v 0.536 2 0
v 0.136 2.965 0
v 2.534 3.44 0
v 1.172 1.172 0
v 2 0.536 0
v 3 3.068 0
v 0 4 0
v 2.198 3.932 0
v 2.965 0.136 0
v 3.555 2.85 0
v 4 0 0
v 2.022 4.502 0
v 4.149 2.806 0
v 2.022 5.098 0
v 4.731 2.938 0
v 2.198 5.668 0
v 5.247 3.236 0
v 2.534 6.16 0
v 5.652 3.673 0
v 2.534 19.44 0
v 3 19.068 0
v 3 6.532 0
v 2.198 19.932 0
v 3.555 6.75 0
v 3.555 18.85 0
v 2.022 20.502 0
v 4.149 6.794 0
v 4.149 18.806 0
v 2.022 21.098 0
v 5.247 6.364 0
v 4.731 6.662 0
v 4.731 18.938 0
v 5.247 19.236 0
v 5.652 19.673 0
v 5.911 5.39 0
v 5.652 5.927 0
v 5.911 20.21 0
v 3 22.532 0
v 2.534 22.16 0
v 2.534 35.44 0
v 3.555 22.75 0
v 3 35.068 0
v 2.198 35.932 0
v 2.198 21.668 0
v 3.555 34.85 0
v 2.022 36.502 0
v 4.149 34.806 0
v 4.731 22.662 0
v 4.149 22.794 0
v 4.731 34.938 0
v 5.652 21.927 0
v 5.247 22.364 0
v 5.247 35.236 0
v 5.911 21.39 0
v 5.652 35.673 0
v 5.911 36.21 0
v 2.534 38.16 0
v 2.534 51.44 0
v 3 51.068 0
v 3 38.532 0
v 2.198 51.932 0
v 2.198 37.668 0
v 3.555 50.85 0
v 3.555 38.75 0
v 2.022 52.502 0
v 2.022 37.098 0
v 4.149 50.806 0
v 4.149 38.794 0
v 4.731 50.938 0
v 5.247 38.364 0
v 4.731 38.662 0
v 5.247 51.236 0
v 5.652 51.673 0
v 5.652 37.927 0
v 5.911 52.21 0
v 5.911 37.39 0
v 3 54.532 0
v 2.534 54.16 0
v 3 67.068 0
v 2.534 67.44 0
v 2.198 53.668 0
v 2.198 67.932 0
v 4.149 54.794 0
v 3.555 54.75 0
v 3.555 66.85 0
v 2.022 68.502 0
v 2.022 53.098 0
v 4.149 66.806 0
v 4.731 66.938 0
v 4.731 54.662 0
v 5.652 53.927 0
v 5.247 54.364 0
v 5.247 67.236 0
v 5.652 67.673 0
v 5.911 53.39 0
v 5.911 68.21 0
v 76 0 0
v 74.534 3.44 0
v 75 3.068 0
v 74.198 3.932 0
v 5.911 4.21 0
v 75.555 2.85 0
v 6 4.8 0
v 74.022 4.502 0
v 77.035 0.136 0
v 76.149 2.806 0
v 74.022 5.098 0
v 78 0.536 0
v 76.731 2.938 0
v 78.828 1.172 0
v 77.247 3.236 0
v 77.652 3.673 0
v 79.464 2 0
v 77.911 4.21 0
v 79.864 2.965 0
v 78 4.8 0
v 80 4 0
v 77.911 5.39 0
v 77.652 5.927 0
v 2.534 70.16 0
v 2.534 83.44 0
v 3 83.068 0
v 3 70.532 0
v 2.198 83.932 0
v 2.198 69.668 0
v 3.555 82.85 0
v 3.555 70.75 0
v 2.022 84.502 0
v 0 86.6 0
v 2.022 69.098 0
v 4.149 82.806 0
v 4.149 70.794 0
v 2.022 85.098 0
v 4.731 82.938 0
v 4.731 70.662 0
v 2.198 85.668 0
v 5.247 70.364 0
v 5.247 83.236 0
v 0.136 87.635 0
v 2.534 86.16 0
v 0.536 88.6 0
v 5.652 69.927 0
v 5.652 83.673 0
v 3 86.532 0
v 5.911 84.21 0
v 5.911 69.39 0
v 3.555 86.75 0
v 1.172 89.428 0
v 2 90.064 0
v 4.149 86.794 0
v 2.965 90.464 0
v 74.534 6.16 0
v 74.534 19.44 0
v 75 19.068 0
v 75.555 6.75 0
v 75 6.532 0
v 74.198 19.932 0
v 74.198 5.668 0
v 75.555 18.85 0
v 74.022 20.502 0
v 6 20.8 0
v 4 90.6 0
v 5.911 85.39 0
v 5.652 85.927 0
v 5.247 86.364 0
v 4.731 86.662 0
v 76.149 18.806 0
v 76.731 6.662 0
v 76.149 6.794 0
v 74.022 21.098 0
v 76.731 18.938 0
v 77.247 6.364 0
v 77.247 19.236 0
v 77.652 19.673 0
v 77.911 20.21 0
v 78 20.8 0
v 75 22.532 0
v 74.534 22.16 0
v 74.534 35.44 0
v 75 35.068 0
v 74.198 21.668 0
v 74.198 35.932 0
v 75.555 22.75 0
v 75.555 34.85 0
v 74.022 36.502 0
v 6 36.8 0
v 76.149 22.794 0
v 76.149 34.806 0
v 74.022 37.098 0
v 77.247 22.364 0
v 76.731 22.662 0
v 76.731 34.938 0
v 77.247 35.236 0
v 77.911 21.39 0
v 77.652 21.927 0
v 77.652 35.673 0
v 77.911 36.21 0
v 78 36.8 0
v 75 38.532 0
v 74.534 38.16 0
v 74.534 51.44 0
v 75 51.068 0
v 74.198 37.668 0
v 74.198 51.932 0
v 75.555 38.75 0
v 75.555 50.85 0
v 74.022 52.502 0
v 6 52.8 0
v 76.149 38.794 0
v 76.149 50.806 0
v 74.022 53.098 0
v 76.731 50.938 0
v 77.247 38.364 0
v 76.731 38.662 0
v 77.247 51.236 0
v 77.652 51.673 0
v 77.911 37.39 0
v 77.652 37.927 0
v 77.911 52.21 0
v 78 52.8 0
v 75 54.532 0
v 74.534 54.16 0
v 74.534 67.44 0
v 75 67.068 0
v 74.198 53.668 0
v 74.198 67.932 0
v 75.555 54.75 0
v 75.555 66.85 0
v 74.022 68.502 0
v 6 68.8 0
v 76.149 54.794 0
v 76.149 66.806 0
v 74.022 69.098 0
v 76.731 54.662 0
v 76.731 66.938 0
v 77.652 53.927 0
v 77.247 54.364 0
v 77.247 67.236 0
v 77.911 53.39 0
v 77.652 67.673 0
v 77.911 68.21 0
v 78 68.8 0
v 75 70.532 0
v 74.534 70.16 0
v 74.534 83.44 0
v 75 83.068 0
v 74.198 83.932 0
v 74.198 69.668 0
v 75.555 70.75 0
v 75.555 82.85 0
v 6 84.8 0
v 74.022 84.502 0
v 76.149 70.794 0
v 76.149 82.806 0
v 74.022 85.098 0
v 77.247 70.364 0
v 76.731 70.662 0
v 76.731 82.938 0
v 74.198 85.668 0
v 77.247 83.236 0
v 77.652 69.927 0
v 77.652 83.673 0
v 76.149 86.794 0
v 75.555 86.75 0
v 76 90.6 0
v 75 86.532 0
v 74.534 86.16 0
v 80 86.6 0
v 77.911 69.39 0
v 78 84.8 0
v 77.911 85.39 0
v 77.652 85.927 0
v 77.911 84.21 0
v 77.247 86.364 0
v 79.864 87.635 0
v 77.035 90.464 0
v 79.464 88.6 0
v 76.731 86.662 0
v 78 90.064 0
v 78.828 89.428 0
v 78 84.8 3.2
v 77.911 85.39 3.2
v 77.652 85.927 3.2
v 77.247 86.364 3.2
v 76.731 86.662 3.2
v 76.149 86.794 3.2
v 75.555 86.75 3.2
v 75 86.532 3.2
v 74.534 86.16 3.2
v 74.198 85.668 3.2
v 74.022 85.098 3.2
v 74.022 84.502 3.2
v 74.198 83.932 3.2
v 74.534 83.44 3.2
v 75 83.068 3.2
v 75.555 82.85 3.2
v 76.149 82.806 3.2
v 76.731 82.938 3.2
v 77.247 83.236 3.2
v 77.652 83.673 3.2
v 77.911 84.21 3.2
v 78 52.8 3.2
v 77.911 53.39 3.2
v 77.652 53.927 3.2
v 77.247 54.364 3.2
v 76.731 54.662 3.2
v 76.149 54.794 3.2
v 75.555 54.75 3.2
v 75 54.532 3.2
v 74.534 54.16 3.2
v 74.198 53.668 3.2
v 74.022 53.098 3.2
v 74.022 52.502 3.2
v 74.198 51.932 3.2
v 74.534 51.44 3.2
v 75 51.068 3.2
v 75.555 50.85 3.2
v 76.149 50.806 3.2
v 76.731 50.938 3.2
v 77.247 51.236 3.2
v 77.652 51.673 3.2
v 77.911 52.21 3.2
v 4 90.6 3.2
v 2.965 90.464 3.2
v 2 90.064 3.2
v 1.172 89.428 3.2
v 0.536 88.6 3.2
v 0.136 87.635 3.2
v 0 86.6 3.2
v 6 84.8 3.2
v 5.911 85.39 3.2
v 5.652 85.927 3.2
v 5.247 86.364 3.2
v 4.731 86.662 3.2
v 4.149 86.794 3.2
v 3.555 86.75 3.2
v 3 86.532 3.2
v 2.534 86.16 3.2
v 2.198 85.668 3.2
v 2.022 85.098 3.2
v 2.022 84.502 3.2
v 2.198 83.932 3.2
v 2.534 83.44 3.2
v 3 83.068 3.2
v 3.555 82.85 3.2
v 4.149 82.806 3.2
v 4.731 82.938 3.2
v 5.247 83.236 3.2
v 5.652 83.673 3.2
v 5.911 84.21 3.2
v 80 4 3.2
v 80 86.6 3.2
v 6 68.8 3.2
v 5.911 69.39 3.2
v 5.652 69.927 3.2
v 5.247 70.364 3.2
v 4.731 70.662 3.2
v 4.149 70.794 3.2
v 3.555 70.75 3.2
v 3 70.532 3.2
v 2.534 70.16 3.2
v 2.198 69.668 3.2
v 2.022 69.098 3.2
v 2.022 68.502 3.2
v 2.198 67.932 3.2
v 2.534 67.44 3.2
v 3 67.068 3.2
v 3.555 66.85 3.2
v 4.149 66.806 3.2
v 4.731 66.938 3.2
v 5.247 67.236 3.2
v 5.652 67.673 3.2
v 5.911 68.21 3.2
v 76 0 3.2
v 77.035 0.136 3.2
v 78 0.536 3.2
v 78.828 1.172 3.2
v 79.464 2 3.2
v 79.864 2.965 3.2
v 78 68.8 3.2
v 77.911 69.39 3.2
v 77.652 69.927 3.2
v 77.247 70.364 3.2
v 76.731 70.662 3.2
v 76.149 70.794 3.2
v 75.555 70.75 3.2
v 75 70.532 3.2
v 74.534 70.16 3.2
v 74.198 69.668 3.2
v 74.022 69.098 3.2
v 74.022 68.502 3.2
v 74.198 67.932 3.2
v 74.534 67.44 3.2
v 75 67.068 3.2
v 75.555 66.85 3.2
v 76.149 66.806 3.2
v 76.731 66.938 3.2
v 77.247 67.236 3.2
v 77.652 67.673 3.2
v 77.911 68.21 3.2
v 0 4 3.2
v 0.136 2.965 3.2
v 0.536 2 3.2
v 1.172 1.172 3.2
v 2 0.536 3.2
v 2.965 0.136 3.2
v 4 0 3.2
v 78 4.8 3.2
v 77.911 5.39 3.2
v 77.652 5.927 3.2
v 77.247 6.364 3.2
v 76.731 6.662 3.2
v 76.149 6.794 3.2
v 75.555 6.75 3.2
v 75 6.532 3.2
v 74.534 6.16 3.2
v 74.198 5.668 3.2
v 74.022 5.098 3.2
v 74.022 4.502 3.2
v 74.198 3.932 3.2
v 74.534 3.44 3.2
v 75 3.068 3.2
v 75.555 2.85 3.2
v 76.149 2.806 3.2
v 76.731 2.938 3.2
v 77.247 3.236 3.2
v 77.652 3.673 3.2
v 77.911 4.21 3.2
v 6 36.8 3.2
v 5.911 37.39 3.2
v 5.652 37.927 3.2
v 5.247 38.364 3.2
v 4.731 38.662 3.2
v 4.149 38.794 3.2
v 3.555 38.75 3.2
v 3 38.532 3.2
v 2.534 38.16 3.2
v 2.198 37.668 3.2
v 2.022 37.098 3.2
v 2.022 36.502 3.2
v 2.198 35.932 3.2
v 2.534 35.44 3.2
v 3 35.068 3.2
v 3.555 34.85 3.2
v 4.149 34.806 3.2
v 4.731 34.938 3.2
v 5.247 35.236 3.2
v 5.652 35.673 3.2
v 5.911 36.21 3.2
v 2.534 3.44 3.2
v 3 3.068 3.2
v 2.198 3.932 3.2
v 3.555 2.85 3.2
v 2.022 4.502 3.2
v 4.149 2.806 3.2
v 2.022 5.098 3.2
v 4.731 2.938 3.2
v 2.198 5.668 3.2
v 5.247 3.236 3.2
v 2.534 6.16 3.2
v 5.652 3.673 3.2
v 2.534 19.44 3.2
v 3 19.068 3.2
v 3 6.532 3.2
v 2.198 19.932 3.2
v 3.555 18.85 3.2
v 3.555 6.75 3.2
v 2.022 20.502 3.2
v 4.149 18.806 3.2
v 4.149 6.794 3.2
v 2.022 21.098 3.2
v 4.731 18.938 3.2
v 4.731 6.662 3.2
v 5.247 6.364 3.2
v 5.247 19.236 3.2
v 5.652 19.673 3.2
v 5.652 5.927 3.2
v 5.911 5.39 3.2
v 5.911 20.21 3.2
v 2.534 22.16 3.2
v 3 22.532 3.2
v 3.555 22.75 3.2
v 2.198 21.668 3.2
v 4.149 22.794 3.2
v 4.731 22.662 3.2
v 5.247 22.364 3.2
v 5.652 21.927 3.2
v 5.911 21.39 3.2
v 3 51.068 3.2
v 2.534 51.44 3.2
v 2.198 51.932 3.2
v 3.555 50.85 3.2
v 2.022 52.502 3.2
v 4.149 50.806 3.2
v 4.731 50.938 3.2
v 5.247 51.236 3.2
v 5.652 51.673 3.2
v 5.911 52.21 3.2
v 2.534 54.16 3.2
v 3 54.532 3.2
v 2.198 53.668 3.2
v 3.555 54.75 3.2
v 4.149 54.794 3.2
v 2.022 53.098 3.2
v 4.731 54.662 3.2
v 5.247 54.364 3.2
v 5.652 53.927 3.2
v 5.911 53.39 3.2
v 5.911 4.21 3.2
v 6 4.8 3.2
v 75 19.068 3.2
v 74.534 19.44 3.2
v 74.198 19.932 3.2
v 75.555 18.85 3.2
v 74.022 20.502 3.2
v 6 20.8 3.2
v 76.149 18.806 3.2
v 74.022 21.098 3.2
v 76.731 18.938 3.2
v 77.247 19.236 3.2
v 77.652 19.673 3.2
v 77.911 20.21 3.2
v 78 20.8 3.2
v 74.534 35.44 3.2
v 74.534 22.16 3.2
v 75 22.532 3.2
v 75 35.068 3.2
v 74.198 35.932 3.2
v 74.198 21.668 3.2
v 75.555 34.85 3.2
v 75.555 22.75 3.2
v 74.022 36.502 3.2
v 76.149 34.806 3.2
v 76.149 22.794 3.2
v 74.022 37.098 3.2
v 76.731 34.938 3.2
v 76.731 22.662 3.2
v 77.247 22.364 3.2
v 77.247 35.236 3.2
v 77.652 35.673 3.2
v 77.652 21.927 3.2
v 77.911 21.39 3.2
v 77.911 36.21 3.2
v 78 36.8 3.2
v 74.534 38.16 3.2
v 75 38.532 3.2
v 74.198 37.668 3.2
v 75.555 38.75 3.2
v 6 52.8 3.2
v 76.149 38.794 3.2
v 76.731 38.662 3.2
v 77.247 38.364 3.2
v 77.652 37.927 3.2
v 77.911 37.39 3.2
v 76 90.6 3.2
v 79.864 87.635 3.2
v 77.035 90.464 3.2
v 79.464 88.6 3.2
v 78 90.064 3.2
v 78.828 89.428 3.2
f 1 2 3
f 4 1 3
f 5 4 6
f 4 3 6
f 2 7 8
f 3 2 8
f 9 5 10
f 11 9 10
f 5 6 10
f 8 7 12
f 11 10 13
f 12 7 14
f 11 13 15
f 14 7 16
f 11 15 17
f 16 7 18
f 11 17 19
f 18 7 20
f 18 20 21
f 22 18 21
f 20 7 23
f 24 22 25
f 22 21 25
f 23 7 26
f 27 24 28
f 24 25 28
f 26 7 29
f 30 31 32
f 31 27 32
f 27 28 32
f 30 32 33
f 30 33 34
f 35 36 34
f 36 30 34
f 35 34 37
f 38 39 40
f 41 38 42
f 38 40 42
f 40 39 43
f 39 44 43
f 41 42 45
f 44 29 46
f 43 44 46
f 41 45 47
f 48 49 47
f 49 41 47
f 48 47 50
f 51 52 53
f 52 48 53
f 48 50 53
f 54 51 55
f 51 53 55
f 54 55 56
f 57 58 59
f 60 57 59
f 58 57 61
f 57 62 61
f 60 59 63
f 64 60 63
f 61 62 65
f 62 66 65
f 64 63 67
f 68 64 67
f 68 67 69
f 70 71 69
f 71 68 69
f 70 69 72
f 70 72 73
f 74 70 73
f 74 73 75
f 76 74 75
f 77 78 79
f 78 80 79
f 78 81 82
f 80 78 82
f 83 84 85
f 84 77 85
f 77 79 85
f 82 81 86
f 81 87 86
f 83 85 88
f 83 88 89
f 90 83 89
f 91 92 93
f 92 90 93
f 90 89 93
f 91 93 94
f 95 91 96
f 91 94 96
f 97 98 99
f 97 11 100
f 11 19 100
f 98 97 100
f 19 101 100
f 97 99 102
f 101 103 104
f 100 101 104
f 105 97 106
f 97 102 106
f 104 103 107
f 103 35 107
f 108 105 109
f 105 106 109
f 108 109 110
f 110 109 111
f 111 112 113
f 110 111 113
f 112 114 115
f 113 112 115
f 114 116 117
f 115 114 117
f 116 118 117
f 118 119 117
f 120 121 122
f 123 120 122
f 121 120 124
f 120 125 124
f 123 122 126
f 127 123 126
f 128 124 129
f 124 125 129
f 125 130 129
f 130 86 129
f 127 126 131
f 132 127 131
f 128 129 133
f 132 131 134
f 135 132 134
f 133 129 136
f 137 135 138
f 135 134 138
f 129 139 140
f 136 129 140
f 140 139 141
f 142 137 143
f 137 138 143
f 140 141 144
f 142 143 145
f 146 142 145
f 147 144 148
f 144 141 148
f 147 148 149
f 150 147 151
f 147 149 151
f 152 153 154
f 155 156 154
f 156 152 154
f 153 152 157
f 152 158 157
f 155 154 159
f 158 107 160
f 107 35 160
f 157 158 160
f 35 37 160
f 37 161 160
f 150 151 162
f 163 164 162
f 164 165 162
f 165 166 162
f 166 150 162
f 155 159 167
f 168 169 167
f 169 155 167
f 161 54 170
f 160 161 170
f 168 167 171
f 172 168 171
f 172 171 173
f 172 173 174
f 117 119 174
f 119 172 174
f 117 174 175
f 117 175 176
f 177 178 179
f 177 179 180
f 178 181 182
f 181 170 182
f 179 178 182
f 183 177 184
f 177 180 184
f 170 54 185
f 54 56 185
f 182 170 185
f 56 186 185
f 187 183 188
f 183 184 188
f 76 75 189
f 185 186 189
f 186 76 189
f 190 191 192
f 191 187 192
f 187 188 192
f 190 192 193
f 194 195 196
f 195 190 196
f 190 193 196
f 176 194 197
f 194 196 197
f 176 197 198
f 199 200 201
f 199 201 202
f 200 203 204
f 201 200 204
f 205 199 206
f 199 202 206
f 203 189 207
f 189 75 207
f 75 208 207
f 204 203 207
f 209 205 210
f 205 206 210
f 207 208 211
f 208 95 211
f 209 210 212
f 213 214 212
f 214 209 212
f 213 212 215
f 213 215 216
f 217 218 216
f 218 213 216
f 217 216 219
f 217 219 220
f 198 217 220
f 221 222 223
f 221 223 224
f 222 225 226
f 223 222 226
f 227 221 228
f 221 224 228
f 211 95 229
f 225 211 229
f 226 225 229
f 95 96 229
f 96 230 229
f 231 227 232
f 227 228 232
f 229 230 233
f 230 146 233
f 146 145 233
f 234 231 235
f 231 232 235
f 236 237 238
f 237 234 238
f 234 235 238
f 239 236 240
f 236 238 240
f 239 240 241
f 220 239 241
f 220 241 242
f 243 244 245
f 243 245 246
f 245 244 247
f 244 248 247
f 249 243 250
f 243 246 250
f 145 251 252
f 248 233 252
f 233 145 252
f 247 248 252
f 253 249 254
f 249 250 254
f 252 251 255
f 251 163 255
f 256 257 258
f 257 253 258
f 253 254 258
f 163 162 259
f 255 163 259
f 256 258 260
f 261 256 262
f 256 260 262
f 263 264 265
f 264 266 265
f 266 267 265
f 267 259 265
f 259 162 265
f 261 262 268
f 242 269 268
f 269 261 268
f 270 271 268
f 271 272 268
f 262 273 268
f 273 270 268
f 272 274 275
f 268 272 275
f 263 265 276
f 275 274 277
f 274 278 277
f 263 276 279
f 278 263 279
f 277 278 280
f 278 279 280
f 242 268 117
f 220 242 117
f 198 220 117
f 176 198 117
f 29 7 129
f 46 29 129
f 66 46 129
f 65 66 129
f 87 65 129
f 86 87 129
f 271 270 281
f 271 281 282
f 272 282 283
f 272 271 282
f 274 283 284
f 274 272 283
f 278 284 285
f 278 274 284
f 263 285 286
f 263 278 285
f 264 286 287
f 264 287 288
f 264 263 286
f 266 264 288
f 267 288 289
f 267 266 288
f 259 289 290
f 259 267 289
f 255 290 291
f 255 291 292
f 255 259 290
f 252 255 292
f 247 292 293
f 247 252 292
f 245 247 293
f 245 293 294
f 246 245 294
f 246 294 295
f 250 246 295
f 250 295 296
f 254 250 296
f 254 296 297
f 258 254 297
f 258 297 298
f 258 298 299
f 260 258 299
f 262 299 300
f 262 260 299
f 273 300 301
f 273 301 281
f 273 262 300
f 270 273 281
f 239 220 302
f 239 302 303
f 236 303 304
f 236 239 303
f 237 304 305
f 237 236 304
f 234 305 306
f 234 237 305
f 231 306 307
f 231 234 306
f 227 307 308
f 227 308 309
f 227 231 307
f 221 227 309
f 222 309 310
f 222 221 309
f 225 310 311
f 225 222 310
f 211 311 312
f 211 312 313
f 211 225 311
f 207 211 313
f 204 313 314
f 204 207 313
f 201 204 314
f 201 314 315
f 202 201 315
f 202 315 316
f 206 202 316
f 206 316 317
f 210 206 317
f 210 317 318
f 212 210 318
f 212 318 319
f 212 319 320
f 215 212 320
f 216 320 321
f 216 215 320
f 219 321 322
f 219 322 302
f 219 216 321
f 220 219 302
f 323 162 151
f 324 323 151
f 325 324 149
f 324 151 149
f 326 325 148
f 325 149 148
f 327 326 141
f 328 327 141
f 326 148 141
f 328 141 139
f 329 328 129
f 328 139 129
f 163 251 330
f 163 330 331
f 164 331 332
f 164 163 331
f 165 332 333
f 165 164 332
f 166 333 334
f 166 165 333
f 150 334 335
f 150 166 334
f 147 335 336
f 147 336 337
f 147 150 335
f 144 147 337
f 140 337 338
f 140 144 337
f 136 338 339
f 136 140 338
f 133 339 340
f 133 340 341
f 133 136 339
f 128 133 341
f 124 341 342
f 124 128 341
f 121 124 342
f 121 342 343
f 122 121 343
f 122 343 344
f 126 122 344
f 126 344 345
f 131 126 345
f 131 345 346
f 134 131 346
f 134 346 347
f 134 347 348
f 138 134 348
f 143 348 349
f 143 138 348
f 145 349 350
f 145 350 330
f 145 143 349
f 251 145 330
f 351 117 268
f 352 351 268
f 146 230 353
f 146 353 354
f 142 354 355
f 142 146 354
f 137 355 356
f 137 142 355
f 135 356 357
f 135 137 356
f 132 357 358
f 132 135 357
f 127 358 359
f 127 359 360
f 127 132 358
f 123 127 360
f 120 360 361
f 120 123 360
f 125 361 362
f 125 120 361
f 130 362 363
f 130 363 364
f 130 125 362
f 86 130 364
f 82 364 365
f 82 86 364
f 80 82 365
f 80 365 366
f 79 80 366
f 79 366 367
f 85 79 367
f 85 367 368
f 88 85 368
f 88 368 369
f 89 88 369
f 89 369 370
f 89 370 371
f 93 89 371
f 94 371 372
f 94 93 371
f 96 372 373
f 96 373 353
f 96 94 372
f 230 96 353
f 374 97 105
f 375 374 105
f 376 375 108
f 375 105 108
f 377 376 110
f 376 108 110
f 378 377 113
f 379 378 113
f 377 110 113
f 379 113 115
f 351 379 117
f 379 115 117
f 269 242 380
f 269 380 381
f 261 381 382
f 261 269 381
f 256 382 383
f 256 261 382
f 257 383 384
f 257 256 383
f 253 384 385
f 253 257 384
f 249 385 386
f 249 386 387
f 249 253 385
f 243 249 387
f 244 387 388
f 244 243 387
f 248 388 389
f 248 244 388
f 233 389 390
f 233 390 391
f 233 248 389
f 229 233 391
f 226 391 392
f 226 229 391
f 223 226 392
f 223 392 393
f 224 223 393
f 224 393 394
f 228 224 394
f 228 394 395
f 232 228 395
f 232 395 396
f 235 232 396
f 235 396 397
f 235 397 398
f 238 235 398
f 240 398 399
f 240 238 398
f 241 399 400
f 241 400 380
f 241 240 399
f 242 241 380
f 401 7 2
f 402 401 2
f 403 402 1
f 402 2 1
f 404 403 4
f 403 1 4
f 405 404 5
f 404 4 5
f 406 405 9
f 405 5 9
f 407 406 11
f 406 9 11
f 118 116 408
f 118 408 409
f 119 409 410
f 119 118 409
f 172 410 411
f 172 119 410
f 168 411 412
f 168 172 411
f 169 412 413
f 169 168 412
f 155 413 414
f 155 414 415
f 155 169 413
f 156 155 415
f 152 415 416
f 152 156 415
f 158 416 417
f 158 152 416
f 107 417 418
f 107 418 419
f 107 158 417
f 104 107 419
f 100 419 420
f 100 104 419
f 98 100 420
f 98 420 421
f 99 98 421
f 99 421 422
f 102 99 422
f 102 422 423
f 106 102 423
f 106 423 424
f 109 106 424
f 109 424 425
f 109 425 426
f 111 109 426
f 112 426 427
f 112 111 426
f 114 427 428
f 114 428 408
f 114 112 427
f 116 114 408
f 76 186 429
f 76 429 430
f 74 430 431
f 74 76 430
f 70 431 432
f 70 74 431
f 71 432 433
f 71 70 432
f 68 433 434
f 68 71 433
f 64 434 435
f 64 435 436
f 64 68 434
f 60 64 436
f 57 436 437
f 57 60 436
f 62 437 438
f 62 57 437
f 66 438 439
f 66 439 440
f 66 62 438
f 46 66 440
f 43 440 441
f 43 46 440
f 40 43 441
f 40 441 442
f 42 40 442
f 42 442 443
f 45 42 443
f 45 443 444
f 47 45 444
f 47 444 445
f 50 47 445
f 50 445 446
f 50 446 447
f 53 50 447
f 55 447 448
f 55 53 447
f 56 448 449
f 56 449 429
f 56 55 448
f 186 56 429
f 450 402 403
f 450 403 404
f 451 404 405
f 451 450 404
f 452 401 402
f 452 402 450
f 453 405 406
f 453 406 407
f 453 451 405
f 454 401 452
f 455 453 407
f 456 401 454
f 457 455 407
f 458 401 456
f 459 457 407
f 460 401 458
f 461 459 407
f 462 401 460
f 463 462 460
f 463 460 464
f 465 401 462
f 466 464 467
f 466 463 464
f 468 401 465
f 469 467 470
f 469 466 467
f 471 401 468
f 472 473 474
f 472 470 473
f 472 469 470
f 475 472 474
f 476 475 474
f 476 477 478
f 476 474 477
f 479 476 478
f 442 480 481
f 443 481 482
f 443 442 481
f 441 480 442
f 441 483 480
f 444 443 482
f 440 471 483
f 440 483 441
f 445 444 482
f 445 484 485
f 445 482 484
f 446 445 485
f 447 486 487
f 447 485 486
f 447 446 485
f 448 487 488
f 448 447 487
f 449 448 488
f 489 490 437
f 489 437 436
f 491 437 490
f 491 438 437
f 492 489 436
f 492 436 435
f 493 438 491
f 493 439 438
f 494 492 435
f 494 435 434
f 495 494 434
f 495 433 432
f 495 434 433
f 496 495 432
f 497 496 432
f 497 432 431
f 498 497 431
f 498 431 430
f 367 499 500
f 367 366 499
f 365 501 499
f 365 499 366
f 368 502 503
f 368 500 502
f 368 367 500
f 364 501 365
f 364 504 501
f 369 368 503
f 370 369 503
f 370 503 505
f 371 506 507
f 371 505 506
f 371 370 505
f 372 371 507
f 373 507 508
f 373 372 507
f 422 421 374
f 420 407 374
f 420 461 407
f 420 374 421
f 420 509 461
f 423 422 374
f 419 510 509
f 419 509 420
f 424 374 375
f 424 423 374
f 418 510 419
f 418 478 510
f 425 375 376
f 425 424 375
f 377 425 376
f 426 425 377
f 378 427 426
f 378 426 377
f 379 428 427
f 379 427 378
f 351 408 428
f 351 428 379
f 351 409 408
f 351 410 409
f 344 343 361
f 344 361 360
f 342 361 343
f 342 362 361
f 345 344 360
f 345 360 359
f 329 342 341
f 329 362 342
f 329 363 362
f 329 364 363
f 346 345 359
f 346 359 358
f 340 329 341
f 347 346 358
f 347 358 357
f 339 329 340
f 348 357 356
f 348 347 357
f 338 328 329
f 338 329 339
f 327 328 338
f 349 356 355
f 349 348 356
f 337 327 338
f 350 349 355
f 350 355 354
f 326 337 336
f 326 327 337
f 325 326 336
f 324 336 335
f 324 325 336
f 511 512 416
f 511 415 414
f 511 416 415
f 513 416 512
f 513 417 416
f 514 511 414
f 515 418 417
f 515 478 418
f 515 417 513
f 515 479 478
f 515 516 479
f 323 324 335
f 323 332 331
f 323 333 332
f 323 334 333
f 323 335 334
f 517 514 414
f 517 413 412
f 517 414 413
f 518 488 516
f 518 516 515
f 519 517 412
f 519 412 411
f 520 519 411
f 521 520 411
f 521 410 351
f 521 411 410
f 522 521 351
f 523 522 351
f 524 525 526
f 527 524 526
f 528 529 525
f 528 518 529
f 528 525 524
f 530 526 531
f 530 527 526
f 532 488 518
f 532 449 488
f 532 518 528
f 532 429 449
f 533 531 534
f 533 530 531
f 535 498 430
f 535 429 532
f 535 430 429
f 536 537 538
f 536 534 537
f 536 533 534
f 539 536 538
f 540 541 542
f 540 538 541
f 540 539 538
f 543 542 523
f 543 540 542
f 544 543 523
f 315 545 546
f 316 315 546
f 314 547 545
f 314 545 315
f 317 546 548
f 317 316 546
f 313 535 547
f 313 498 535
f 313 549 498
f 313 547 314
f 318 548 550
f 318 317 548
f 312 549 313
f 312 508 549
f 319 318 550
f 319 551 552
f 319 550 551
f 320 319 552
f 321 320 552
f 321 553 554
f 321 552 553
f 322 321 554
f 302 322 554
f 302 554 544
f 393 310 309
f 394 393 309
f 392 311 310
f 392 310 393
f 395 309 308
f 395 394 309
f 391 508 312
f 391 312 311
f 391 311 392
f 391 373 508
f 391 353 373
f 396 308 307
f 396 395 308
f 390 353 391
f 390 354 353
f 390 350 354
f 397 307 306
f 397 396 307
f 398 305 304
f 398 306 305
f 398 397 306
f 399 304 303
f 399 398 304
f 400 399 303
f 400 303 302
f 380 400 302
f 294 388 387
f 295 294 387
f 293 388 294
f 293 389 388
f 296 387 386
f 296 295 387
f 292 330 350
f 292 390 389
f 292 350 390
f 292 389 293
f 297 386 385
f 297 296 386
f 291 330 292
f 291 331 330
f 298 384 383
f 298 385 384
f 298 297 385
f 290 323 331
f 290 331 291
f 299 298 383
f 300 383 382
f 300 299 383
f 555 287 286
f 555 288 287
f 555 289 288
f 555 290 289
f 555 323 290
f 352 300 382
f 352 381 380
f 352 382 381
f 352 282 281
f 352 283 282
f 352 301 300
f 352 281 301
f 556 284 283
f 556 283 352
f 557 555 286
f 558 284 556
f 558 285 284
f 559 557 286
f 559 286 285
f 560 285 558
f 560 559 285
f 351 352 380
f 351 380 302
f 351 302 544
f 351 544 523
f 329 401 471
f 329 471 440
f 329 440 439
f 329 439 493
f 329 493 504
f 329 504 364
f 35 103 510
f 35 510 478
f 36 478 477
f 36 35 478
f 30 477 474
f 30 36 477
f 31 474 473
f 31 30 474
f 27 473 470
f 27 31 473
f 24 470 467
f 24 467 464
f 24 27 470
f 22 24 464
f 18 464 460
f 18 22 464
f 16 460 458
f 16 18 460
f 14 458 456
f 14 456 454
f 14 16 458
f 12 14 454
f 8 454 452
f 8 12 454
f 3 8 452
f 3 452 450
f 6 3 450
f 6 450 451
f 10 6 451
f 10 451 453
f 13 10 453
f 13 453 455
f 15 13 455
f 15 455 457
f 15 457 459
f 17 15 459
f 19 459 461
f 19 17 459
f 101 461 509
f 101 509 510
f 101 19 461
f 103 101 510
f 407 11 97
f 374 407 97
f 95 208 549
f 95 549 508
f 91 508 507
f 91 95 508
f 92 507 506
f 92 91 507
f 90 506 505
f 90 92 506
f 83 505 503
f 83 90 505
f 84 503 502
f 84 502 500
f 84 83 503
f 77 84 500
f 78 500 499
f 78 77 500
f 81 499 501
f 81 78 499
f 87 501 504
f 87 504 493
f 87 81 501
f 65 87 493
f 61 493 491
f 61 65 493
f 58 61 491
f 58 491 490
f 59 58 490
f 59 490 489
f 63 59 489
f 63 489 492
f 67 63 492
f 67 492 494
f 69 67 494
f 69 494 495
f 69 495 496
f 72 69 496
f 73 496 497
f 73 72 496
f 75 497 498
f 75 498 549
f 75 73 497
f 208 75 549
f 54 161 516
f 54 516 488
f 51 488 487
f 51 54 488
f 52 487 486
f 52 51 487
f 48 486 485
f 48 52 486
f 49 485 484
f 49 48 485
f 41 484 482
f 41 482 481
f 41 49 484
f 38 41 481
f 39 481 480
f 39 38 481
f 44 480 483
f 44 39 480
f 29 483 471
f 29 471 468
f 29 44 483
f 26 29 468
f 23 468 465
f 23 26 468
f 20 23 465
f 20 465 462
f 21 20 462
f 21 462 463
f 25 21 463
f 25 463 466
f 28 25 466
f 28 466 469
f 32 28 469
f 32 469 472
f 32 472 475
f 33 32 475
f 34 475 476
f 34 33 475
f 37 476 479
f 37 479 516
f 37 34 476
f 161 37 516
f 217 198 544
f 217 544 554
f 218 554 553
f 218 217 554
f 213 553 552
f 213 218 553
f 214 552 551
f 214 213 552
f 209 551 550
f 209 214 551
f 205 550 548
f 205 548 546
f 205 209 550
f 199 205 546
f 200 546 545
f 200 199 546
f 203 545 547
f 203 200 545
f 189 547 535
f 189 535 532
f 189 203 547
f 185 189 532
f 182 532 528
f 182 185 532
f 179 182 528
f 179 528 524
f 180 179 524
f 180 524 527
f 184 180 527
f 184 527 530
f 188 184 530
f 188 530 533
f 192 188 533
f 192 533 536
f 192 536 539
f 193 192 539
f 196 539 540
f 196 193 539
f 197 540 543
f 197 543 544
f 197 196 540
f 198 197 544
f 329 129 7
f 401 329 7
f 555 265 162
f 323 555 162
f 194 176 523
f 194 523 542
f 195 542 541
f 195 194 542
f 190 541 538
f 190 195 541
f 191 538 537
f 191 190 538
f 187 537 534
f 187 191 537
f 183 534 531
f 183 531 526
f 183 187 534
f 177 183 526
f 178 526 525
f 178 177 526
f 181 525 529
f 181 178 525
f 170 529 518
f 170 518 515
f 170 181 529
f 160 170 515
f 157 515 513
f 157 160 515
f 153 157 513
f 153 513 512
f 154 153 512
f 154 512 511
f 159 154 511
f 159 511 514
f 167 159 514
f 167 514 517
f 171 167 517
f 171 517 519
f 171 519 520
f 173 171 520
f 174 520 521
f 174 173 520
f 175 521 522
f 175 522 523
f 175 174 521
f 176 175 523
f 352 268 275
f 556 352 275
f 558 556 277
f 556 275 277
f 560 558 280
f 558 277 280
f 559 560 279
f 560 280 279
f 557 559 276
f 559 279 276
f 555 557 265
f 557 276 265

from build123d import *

# Parameters (mm, degrees)
F0_R     = 2
F1_DEPTH = 3.2


with BuildPart() as f1:
    # F0 (on Top) → F1 (new body)
    with BuildSketch(Plane.XY):
        with BuildLine():
            ThreePointArc((0, 4), (1.171573, 1.171573), (4, 0))
            Line((4, 0), (76, 0))
            ThreePointArc((76, 0), (78.828427, 1.171573), (80, 4))
            Line((80, 4), (80, 86.6))
            ThreePointArc((80, 86.6), (78.828427, 89.428427), (76, 90.6))
            Line((76, 90.6), (4, 90.6))
            ThreePointArc((4, 90.6), (1.171573, 89.428427), (0, 86.6))
            Line((0, 86.6), (0, 4))
        make_face()
        with Locations((4, 4.8)):
            Circle(F0_R, mode=Mode.SUBTRACT)
        with Locations((4, 20.8)):
            Circle(F0_R, mode=Mode.SUBTRACT)
        with Locations((4, 36.8)):
            Circle(F0_R, mode=Mode.SUBTRACT)
        with Locations((76, 4.8)):
            Circle(F0_R, mode=Mode.SUBTRACT)
        with Locations((76, 20.8)):
            Circle(F0_R, mode=Mode.SUBTRACT)
        with Locations((76, 36.8)):
            Circle(F0_R, mode=Mode.SUBTRACT)
        with Locations((4, 52.8)):
            Circle(F0_R, mode=Mode.SUBTRACT)
        with Locations((4, 68.8)):
            Circle(F0_R, mode=Mode.SUBTRACT)
        with Locations((4, 84.8)):
            Circle(F0_R, mode=Mode.SUBTRACT)
        with Locations((76, 52.8)):
            Circle(F0_R, mode=Mode.SUBTRACT)
        with Locations((76, 68.8)):
            Circle(F0_R, mode=Mode.SUBTRACT)
        with Locations((76, 84.8)):
            Circle(F0_R, mode=Mode.SUBTRACT)
    extrude(amount=F1_DEPTH)


solid = f1.part
